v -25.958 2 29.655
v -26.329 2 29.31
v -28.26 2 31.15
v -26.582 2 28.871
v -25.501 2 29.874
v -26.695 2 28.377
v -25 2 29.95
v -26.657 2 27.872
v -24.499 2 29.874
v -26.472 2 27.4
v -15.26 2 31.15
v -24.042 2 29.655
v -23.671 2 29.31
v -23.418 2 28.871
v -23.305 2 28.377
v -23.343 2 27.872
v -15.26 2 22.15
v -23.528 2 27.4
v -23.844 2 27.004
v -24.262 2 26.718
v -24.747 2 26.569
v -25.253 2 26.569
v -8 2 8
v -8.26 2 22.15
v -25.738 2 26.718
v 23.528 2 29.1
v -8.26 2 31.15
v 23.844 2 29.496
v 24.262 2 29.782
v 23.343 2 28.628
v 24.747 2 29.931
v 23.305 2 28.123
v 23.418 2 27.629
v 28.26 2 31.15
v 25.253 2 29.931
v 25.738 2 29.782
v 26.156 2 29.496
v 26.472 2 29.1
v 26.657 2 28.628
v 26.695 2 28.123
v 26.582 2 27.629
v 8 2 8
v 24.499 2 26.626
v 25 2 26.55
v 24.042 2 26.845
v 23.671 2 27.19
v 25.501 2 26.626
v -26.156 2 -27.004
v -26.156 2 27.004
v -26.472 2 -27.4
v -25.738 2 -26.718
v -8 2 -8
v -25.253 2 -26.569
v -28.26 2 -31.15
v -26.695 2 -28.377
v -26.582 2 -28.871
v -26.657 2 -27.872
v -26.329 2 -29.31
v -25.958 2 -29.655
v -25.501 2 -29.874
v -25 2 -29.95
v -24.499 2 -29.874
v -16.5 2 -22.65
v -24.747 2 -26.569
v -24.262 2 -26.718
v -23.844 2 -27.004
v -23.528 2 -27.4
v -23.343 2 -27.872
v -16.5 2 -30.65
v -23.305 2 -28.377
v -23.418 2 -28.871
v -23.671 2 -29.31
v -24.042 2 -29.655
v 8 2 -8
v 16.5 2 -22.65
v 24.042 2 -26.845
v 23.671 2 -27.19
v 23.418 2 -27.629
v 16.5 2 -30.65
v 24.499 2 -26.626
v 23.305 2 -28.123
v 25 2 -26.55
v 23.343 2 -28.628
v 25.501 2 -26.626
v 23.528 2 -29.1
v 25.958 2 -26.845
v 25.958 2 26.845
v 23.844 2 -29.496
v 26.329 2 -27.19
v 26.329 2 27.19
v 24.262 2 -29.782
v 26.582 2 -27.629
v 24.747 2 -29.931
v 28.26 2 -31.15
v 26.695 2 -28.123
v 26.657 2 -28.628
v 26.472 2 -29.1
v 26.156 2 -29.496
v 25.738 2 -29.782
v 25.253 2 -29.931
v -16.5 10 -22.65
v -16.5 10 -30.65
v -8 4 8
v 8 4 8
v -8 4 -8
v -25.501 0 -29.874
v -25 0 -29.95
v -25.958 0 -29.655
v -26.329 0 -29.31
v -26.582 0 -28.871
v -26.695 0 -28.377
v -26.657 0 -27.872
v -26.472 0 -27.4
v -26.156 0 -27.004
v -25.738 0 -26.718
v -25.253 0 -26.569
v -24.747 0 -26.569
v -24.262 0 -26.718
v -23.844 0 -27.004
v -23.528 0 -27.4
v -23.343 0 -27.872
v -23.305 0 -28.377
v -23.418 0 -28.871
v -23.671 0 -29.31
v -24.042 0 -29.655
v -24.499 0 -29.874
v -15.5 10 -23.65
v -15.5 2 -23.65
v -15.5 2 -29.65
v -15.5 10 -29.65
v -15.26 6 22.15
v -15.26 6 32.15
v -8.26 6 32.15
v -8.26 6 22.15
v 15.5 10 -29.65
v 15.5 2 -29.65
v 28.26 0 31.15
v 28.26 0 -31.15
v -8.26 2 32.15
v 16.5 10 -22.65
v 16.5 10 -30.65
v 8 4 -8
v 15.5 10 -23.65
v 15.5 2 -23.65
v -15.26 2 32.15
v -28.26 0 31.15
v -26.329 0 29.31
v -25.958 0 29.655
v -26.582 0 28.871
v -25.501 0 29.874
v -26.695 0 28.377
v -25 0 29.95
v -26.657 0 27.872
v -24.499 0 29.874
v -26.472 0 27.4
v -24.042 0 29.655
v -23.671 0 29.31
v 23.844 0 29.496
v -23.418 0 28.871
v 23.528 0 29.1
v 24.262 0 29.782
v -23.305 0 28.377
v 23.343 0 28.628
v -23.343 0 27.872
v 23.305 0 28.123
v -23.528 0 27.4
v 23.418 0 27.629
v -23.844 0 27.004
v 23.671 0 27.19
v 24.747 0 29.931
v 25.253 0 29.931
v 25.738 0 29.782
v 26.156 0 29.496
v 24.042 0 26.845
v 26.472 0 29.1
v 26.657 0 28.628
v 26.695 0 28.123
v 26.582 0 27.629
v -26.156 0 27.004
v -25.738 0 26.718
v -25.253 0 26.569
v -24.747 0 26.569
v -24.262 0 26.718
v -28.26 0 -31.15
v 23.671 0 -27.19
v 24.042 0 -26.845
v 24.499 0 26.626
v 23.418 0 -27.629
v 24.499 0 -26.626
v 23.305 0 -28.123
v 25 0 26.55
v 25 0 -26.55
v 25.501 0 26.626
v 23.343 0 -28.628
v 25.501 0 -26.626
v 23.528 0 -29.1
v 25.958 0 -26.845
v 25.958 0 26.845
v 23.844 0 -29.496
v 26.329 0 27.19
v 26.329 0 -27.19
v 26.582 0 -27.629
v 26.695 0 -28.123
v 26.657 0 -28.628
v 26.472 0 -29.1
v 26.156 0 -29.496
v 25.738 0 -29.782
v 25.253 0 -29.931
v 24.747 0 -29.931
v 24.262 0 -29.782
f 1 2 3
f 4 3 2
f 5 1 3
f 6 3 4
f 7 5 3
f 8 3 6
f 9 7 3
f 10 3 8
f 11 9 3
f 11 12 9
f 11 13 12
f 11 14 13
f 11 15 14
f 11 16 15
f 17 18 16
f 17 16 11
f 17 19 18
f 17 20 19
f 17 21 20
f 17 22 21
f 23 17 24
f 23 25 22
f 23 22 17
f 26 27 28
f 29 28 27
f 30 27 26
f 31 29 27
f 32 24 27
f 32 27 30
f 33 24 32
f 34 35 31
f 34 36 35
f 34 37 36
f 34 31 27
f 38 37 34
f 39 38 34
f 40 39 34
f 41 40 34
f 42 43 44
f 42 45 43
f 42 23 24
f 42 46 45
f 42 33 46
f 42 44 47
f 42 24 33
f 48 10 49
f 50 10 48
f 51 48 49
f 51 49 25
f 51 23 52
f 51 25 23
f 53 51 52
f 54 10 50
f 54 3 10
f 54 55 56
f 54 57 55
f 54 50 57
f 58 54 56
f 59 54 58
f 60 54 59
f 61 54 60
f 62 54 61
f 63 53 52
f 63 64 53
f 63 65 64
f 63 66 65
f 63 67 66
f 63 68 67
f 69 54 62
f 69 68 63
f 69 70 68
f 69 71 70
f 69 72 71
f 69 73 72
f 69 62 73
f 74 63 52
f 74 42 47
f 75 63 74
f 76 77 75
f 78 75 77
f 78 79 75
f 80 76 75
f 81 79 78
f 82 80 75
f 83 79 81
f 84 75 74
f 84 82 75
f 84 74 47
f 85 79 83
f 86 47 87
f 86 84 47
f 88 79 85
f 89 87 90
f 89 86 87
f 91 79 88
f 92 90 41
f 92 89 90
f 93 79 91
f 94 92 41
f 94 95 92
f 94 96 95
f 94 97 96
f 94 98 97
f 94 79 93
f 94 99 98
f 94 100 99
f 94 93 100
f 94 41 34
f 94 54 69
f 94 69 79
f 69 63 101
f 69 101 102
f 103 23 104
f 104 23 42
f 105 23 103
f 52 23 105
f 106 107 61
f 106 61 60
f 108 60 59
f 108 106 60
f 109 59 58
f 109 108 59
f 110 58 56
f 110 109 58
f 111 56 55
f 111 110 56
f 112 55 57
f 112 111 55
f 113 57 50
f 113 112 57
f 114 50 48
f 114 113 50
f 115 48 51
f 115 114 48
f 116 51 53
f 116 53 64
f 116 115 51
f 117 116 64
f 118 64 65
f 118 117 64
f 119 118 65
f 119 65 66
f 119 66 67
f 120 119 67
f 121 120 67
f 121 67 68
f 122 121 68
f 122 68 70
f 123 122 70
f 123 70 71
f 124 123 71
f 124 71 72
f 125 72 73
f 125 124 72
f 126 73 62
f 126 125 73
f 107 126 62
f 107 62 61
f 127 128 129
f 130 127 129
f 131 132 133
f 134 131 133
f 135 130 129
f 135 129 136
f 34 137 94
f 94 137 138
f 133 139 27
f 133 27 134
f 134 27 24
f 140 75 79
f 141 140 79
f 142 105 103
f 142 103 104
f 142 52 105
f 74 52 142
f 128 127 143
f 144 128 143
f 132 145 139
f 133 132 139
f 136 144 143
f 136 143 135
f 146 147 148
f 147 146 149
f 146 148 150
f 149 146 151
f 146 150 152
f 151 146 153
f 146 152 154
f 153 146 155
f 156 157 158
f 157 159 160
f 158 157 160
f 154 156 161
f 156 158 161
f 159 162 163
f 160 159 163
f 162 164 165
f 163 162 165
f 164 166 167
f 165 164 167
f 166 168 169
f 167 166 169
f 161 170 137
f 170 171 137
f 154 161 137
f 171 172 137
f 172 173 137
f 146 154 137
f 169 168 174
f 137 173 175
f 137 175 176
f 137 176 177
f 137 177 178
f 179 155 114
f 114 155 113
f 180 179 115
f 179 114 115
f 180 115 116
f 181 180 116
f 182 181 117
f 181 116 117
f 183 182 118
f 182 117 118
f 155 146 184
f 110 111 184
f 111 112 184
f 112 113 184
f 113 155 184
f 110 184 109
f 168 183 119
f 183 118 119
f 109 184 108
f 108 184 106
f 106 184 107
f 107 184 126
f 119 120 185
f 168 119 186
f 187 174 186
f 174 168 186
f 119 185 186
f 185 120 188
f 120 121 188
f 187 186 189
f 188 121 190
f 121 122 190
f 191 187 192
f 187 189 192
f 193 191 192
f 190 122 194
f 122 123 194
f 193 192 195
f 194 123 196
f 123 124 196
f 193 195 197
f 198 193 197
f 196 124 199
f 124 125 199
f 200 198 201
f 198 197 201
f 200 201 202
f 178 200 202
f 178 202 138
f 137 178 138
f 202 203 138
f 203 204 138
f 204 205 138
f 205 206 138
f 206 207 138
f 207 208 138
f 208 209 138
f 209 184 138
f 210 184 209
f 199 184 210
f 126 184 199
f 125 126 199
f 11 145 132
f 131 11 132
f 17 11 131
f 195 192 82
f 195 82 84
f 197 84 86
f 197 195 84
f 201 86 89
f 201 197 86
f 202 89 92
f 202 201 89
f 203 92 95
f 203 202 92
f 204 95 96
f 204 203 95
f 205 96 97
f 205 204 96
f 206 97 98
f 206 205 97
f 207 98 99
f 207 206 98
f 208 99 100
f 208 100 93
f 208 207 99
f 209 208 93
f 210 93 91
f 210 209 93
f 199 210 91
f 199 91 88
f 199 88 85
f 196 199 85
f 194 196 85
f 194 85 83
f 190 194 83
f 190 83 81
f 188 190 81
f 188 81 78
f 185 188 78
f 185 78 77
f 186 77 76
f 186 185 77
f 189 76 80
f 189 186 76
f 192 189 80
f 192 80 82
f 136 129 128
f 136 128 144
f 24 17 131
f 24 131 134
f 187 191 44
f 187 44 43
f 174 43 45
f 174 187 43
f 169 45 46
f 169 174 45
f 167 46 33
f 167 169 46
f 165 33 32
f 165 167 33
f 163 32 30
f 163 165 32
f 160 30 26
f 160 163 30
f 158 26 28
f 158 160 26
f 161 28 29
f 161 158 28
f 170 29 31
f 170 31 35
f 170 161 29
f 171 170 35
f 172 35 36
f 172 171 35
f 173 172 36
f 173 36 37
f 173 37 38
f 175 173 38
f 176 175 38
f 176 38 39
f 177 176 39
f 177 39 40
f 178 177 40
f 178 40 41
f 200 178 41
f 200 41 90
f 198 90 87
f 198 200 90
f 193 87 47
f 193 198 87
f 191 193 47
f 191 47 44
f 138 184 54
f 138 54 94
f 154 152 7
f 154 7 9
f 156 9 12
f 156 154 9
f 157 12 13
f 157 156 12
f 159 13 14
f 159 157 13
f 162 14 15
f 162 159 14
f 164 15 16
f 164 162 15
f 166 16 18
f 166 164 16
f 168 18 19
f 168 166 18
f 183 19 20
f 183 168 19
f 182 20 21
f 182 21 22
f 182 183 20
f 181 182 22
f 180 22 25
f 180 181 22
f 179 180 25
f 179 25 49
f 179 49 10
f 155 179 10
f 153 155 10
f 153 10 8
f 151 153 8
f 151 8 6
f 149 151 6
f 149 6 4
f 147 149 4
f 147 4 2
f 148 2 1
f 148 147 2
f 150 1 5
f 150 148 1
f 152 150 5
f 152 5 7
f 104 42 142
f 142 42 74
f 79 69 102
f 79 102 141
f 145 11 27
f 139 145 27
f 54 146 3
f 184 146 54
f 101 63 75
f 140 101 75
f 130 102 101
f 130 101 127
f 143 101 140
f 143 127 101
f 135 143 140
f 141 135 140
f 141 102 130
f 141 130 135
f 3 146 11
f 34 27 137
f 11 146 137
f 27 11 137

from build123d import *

# Parameters (mm, degrees)
SKETCH_1_W          = 56.52
SKETCH_1_H          = 62.3
SKETCH_1_R          = 1.7
EXTRUDE_1_DEPTH     = 2
SKETCH_2_W          = 16
SKETCH_2_H          = 16
EXTRUDE_2_DEPTH     = 2
SKETCH_3_W          = 33
SKETCH_3_H          = 8
EXTRUDE_3_DEPTH     = 8
SKETCH_4_W          = 31
SKETCH_4_H          = 6
CUT_EXTRUDE_1_DEPTH = 8
SKETCH_5_W          = 7
SKETCH_5_H          = 10
EXTRUDE_4_DEPTH     = 4


with BuildPart() as part:
    # 草图1 → 凸台-拉伸1 (new body)
    with BuildSketch(Plane(origin=(0, 0, 0), x_dir=(1, 0, 0), z_dir=(0, 1, 0))):
        Rectangle(SKETCH_1_W, SKETCH_1_H)
        with Locations(Location((25, 28.25, 0), (0, 0, 270))):
            Circle(SKETCH_1_R, mode=Mode.SUBTRACT)
        with Locations(Location((25, -28.25, 0), (0, 0, 90))):
            Circle(SKETCH_1_R, mode=Mode.SUBTRACT)
        with Locations(Location((-25, -28.25, 0), (0, 0, 270))):
            Circle(SKETCH_1_R, mode=Mode.SUBTRACT)
        with Locations(Location((-25, 28.25, 0), (0, 0, 90))):
            Circle(SKETCH_1_R, mode=Mode.SUBTRACT)
    extrude(amount=EXTRUDE_1_DEPTH)

    # 草图2 → 凸台-拉伸2 (add)
    with BuildSketch(Plane(origin=(0, 2, 0), x_dir=(1, 0, 0), z_dir=(0, 1, 0))):
        Rectangle(SKETCH_2_W, SKETCH_2_H)
    extrude(amount=EXTRUDE_2_DEPTH)

    # 草图3 → 凸台-拉伸3 (add)
    with BuildSketch(Plane(origin=(0, 2, 0), x_dir=(1, 0, 0), z_dir=(0, 1, 0))):
        with Locations((0, 26.65)):
            Rectangle(SKETCH_3_W, SKETCH_3_H)
    extrude(amount=EXTRUDE_3_DEPTH)

    # 草图4 → 切除-拉伸1 (cut)
    with BuildSketch(Plane(origin=(0, 10, 0), x_dir=(1, 0, 0), z_dir=(0, 1, 0))):
        with Locations((0, 26.65)):
            Rectangle(SKETCH_4_W, SKETCH_4_H)
    extrude(amount=-CUT_EXTRUDE_1_DEPTH, mode=Mode.SUBTRACT)

    # 草图5 → 凸台-拉伸4 (add)
    with BuildSketch(Plane(origin=(0, 2, 0), x_dir=(1, 0, 0), z_dir=(0, 1, 0))):
        with Locations((-11.76, -27.15)):
            Rectangle(SKETCH_5_W, SKETCH_5_H)
    extrude(amount=EXTRUDE_4_DEPTH)


solid = part.part
